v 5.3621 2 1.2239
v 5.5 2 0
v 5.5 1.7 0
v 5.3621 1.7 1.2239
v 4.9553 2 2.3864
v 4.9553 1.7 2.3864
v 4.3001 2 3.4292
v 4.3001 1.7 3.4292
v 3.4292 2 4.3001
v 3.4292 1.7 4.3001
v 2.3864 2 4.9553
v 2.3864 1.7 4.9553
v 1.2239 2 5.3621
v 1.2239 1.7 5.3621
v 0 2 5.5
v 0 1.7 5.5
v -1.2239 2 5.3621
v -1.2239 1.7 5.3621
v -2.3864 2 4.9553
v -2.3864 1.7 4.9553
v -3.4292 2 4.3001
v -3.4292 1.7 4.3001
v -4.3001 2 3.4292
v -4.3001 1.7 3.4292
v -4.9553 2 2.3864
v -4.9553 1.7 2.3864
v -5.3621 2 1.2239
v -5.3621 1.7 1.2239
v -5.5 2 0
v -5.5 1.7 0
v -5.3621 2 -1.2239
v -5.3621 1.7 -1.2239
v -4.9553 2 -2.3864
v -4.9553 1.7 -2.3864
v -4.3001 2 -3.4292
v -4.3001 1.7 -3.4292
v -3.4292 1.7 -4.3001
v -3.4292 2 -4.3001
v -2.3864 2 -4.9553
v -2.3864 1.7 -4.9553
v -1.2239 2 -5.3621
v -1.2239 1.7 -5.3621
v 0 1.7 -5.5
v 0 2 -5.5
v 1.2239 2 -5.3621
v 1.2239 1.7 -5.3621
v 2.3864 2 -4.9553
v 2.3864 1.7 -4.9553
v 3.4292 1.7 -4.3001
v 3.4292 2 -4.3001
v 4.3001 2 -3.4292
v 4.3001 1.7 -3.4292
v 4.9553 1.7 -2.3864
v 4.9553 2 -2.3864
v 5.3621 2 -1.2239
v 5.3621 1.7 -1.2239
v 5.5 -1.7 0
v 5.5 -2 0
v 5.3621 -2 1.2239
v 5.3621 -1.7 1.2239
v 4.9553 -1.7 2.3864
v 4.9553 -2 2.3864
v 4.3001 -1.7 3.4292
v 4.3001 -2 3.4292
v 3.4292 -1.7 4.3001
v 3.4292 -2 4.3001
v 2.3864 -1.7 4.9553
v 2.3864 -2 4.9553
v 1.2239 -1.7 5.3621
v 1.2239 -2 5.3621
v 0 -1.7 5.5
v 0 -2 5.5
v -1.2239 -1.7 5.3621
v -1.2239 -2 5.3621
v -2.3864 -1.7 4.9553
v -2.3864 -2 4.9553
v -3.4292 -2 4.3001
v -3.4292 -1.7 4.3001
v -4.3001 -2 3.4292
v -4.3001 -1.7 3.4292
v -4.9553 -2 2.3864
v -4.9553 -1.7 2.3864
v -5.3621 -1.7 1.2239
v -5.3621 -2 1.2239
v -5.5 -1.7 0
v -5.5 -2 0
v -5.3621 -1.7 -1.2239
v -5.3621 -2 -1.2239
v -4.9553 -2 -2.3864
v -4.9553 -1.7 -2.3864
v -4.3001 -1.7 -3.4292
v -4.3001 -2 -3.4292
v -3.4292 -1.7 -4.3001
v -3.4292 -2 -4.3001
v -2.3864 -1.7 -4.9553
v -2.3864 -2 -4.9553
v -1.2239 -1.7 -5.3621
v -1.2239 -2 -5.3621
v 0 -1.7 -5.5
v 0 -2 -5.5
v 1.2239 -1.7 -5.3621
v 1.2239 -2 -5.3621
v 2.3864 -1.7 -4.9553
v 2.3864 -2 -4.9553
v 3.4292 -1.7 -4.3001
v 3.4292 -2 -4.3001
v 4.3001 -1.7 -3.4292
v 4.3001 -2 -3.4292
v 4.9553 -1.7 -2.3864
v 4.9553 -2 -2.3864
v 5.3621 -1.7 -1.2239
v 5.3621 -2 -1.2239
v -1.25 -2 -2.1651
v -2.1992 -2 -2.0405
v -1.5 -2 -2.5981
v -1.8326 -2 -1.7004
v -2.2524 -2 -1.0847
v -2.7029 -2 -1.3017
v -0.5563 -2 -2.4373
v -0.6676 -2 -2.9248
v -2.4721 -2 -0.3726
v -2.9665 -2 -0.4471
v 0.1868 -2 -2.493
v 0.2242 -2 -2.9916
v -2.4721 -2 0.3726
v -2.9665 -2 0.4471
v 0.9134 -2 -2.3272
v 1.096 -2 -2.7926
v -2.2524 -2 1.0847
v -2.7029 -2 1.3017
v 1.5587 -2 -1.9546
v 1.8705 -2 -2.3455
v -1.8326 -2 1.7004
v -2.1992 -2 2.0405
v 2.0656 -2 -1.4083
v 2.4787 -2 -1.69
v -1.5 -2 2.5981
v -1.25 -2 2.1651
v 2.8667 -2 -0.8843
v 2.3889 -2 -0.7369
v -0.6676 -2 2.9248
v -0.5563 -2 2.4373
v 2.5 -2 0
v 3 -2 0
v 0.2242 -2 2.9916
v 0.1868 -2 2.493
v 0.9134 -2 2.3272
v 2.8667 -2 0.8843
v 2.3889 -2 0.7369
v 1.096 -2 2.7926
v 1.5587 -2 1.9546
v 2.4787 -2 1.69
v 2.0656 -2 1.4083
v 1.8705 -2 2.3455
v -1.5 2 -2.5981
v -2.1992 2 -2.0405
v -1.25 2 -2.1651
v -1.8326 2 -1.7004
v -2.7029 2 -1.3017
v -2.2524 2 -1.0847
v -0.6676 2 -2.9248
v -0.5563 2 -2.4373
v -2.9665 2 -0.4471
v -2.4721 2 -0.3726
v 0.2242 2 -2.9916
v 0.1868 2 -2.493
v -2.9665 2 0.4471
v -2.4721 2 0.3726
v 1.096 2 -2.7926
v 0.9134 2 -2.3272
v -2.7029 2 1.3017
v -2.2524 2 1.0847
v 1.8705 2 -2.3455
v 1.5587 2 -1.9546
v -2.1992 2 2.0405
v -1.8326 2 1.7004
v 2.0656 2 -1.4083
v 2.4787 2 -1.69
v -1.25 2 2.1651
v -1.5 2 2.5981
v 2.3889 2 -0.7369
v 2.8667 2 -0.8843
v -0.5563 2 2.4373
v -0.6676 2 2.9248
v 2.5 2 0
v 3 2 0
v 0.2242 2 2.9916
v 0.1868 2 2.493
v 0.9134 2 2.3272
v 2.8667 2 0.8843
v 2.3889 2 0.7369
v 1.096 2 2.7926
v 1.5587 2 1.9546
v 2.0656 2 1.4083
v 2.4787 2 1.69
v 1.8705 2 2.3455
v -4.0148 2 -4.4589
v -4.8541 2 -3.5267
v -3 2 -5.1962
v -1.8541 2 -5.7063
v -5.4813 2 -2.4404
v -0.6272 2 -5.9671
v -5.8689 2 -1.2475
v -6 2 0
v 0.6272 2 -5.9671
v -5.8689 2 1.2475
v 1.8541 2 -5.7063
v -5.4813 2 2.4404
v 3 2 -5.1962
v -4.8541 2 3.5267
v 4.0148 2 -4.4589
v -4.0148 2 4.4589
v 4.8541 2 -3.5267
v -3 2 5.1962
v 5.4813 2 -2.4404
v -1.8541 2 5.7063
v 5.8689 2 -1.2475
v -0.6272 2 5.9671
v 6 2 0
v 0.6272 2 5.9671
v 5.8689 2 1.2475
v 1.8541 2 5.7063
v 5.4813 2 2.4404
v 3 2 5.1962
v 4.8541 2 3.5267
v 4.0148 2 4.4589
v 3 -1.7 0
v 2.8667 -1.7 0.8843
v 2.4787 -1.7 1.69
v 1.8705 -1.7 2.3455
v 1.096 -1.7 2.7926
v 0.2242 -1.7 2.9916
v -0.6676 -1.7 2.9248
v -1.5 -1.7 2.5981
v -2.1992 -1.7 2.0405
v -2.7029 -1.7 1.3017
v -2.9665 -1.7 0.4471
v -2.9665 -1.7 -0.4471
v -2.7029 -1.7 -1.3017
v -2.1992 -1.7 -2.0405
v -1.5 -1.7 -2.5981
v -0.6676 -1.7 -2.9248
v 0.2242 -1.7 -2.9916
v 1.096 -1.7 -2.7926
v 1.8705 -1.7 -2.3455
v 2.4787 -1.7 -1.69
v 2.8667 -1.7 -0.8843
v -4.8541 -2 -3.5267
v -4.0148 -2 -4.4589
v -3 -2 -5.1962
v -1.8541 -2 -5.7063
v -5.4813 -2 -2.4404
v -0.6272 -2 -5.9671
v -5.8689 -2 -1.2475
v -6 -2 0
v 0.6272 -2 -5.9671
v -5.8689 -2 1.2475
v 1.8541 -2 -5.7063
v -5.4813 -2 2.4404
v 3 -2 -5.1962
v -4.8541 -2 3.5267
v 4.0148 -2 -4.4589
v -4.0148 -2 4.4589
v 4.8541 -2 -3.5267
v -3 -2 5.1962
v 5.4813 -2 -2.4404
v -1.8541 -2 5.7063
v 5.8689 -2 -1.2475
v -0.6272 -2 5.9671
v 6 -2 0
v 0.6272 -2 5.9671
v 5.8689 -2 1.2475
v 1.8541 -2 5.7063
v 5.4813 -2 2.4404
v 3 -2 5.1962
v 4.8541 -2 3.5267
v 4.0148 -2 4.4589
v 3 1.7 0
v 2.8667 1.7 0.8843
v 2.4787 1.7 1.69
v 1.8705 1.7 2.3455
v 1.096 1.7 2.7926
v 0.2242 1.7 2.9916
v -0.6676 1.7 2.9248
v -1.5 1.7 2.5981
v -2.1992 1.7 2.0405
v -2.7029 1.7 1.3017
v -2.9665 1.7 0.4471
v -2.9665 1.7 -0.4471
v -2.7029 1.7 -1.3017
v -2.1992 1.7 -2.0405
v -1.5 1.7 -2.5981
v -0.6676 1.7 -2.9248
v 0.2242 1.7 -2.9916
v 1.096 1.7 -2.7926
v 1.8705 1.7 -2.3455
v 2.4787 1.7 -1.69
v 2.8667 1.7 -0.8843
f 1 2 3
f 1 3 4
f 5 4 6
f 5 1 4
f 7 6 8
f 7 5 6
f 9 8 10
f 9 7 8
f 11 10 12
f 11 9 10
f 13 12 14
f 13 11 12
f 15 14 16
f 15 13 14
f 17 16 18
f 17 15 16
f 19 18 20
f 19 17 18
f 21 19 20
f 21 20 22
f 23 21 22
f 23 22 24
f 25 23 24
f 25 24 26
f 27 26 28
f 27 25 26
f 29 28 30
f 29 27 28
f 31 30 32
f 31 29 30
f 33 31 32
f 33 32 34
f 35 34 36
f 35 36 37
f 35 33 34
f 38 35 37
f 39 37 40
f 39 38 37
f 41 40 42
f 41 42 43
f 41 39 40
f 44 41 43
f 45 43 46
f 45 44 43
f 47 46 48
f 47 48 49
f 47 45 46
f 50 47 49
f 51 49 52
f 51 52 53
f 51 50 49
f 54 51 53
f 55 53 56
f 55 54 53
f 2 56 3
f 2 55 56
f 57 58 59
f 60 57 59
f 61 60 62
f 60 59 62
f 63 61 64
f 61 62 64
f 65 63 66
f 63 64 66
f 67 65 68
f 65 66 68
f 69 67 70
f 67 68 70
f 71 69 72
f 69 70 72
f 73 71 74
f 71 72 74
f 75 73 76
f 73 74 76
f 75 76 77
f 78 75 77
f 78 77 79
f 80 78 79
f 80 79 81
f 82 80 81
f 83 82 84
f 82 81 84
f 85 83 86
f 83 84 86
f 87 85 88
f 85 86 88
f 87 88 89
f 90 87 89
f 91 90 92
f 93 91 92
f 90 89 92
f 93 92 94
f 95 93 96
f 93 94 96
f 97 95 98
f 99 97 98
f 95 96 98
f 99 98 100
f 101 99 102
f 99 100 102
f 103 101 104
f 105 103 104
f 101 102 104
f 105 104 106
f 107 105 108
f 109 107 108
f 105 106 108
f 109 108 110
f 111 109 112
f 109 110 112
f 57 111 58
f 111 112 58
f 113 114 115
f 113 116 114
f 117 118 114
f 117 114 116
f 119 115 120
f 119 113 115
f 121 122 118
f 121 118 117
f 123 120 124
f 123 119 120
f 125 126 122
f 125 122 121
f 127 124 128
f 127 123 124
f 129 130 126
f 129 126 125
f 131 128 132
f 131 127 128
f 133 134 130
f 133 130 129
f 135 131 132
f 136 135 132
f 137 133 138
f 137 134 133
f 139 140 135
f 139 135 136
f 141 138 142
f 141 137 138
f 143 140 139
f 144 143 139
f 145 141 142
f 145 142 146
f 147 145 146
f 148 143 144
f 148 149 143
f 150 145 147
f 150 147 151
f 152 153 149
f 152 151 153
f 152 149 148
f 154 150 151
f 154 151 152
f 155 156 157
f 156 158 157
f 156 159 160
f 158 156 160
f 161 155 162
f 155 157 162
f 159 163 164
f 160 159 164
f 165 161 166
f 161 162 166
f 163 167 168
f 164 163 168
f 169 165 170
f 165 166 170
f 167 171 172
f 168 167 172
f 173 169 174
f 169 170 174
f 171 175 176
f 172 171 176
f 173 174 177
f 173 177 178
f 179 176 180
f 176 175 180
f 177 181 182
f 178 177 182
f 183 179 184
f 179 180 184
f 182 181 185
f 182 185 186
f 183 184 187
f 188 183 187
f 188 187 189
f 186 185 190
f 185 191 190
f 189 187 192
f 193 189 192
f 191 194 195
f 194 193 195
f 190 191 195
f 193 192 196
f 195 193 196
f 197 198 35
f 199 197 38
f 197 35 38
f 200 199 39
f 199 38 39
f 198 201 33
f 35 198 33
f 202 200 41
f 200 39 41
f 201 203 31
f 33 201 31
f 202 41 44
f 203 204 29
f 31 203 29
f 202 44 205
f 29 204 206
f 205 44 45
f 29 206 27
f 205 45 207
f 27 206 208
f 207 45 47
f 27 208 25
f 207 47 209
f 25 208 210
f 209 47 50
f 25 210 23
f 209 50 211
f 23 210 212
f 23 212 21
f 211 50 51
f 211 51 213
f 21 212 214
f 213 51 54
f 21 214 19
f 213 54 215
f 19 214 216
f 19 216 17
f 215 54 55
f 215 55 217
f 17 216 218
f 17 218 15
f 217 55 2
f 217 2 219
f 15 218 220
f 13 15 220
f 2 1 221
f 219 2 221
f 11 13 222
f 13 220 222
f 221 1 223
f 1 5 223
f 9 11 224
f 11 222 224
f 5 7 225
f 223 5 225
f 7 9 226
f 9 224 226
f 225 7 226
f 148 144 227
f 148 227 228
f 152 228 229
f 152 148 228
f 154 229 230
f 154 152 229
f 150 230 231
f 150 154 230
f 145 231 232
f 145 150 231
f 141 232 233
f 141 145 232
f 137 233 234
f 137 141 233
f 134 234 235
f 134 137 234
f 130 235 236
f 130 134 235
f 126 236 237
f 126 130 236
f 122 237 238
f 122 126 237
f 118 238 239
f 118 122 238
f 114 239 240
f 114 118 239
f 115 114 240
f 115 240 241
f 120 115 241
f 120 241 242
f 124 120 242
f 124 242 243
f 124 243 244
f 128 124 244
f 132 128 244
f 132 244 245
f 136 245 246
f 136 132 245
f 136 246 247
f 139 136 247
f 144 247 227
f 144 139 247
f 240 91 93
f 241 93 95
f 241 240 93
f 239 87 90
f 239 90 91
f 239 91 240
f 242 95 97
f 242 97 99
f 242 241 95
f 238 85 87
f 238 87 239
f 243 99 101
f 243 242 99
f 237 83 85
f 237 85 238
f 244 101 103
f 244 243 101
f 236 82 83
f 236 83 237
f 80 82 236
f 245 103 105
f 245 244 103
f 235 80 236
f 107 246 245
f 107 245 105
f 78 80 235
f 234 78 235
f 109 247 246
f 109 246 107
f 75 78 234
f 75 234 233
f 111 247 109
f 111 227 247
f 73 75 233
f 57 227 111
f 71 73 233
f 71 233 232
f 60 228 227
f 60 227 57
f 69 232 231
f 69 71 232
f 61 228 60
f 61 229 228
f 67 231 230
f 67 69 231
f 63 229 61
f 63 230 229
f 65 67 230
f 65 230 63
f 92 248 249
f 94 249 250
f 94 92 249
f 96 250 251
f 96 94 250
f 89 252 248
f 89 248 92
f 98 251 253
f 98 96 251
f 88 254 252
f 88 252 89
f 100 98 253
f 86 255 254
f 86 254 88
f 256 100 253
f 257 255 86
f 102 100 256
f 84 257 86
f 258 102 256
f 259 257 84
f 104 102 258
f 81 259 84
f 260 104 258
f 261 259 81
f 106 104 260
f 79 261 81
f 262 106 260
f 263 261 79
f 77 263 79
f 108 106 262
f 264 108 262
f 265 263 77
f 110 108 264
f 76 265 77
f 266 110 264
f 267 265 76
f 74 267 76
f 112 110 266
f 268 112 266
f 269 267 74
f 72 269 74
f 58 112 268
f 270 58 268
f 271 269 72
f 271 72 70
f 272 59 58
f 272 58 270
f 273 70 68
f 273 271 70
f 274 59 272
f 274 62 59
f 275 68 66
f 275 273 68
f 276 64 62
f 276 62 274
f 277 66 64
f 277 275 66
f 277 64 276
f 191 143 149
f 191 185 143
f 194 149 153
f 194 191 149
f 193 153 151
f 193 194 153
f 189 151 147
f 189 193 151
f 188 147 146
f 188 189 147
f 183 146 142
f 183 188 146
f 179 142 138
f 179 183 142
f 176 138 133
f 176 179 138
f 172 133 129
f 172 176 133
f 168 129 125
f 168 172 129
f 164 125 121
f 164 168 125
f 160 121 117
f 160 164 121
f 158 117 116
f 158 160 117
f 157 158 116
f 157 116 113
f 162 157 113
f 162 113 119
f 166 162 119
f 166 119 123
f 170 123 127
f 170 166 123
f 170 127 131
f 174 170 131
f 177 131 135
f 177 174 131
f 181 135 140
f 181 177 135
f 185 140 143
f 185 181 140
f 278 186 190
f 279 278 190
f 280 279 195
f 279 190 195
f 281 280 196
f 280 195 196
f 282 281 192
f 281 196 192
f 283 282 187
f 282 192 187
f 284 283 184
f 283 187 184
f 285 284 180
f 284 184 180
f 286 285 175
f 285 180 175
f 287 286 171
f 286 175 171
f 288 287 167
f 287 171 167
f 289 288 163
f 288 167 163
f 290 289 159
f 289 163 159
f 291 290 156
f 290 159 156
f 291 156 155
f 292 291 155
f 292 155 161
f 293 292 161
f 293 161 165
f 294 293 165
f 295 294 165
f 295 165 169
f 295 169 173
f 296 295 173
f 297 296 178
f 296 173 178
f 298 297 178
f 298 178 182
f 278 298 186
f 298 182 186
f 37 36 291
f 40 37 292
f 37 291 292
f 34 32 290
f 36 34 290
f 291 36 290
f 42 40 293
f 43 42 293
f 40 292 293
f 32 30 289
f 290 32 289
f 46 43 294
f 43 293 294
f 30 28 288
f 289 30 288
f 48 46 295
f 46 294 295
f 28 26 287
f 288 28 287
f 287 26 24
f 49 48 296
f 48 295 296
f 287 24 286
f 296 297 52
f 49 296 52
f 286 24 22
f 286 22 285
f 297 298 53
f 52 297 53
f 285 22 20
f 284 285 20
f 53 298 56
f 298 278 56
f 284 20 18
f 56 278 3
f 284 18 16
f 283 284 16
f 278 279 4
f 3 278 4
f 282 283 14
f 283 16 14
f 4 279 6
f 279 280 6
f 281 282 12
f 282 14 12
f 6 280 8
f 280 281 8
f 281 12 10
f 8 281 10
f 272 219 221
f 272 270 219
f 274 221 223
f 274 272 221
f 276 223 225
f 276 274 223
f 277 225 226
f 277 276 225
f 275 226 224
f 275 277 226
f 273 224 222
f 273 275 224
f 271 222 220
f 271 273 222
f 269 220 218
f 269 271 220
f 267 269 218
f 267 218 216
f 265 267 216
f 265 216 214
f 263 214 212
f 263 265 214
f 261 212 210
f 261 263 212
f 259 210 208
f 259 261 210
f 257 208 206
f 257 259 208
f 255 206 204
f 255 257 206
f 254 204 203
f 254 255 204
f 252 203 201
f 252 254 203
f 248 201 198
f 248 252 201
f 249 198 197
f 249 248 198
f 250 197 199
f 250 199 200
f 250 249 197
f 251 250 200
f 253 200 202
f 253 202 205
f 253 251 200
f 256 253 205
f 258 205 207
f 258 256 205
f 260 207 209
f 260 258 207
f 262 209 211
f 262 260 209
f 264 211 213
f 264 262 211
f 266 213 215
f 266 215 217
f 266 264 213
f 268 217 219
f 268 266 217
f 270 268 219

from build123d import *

# Parameters (mm, degrees)
F0_R     = 6
F0_R_2   = 2.5
F1_DEPTH = 2
F2_R     = 5.5
F2_R_2   = 3
F3_DEPTH = 0.3


# Not quite as in the source:
# - a pattern or mirror of a feature is missing from the dataset's text; its kind, count and spacing are read off the source's solid


with BuildPart() as f1:
    # F0 (on Front) → F1 (new body, symmetric)
    with BuildSketch(Plane.XZ):
        Circle(F0_R)
        Circle(F0_R_2, mode=Mode.SUBTRACT)
    extrude(amount=F1_DEPTH, both=True)

    # F2 (on face) → F3 (cut)
    with BuildSketch(Plane.XZ.offset(2)):
        Circle(F2_R)
        Circle(F2_R_2, mode=Mode.SUBTRACT)
    f3 = extrude(amount=-F3_DEPTH, mode=Mode.SUBTRACT)

    # F3_copies: F3 across plane
    add(f3.mirror(Plane.ZX), mode=Mode.SUBTRACT)


solid = f1.part
